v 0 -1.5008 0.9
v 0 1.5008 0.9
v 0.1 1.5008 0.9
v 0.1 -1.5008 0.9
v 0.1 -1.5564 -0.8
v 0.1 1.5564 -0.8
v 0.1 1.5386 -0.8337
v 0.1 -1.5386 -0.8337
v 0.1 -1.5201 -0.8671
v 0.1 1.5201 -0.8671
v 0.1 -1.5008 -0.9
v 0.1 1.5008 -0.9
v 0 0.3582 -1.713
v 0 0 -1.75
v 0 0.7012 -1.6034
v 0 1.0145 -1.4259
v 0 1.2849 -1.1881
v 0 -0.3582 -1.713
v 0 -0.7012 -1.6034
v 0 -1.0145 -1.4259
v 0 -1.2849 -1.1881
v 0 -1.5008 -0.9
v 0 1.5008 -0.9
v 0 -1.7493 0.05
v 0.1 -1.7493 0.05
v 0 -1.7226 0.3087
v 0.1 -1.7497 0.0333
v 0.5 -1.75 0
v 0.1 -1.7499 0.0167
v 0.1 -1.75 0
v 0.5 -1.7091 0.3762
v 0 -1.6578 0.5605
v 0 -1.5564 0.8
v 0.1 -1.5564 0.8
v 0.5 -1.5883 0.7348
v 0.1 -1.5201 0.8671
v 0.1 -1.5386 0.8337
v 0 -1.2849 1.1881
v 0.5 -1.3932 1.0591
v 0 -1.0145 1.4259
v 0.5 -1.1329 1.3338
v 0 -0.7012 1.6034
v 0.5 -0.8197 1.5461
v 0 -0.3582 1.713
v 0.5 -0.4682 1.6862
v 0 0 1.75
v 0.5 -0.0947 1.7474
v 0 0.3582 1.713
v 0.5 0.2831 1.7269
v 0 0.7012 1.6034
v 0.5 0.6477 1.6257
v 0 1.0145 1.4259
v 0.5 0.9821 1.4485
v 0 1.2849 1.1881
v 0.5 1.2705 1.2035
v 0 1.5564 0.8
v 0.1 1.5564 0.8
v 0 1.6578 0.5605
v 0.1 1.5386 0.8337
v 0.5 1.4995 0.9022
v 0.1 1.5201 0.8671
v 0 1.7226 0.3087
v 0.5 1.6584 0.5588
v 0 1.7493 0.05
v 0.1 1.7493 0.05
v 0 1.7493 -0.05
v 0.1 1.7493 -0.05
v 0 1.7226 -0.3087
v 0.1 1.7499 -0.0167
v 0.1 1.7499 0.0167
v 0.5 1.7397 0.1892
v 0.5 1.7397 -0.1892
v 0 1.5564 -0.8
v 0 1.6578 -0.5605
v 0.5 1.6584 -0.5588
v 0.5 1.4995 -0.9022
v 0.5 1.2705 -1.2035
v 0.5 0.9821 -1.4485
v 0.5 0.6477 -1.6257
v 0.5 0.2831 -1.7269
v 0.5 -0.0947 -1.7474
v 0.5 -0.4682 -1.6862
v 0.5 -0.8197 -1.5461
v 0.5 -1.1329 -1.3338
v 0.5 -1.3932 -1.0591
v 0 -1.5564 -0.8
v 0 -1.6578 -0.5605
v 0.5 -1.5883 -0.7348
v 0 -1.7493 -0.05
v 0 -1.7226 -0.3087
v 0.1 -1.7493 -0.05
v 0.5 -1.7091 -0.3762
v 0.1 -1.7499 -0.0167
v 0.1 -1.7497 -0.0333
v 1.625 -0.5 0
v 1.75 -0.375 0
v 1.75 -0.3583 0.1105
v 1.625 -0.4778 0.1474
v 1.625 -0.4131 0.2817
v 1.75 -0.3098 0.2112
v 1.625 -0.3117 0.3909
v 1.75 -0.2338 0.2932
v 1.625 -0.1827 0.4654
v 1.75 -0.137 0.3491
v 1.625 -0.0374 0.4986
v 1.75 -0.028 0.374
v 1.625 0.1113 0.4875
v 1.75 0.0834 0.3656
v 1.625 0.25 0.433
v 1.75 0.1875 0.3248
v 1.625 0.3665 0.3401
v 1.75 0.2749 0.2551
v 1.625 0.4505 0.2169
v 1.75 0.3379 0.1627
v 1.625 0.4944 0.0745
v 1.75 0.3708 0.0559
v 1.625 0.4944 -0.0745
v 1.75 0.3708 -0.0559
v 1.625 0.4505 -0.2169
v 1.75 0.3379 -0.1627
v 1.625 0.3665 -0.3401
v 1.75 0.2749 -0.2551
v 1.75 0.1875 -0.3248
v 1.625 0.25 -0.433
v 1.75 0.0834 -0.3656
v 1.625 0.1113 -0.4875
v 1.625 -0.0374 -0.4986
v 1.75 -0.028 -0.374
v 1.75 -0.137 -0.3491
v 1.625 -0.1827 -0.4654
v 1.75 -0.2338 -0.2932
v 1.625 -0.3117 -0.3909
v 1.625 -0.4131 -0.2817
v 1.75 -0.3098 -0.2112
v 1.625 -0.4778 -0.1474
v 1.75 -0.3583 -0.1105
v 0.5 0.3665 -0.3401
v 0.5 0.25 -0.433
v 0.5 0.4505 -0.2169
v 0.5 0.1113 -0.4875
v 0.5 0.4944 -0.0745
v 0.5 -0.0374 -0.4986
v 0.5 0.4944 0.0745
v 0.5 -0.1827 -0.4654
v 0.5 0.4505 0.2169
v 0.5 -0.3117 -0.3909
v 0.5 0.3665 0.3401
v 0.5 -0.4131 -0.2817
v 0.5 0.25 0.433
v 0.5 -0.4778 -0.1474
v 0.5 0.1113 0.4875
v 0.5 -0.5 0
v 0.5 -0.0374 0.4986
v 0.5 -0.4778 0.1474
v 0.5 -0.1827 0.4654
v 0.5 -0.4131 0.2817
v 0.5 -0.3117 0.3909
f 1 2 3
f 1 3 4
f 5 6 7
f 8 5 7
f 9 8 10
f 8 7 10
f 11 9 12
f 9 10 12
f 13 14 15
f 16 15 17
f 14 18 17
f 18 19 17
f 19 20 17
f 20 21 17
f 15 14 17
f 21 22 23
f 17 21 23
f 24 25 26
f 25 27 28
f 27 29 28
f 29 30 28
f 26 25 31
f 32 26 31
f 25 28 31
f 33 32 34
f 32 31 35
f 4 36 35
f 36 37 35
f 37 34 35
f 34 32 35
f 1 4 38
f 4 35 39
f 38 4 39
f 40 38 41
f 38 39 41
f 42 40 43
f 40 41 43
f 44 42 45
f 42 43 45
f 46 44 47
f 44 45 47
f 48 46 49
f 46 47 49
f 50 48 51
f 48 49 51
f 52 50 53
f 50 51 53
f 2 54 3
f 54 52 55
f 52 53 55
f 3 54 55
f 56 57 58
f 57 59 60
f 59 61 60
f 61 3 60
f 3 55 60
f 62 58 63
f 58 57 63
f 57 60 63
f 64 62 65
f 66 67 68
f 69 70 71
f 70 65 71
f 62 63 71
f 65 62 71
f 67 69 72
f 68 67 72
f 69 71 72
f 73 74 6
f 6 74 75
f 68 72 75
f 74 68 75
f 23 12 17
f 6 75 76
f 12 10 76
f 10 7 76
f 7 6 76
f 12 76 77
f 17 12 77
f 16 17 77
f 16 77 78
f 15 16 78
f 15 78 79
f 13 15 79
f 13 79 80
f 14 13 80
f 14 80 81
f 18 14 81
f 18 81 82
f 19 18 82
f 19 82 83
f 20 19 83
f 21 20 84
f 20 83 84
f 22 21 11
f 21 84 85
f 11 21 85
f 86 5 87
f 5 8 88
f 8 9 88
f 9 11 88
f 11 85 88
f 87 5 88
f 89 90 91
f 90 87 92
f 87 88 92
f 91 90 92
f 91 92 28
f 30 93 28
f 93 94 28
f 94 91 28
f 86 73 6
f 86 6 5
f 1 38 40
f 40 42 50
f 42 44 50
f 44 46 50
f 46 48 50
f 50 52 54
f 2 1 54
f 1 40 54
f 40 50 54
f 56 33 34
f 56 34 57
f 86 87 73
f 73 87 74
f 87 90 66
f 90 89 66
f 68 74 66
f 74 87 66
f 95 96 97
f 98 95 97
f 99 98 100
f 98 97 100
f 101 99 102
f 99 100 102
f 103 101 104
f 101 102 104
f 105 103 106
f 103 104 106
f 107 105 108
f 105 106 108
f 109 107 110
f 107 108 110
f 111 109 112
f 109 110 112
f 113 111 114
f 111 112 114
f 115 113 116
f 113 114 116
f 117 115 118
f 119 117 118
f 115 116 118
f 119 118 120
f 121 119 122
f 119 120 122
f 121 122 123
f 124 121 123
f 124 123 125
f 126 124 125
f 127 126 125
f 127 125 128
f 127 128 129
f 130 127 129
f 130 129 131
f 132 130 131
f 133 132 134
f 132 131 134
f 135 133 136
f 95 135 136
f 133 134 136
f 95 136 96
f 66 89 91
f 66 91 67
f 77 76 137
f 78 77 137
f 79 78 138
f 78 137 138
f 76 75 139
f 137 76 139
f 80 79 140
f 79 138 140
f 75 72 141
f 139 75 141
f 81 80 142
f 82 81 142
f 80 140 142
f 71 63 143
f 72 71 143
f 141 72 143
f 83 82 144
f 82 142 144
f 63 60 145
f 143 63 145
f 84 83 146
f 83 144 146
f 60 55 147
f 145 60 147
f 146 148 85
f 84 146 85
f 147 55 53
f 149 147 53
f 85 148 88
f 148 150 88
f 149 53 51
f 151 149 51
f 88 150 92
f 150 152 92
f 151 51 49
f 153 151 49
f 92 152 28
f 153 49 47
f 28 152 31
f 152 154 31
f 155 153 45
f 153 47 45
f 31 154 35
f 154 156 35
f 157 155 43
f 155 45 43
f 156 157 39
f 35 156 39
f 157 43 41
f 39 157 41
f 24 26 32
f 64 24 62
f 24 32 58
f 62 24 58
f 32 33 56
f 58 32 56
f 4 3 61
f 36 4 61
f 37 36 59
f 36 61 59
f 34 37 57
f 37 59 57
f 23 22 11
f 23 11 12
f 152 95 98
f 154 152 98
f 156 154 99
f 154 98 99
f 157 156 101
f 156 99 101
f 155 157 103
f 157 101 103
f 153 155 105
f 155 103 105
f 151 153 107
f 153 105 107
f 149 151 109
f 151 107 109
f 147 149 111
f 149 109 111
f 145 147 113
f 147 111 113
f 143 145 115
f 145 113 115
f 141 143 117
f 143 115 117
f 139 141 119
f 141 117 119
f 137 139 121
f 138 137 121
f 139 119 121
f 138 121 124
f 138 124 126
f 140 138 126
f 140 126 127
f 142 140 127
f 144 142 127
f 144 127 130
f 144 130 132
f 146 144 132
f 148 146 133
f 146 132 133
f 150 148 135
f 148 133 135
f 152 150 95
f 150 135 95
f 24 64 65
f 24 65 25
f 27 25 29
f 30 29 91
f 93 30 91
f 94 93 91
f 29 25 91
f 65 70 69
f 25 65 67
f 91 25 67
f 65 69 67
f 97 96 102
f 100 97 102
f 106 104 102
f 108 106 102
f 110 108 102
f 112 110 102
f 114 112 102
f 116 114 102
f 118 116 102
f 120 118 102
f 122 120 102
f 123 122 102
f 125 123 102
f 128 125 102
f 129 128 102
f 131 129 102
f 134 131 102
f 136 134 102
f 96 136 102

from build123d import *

# Parameters (mm, degrees)
CHAFL_N1_SIZE         = 0.125
CORTAR_EXTRUIR1_DEPTH = 0.1


with BuildPart() as part:
    # Croquis1 → Revolución1 (revolve)
    with BuildSketch(Plane.XY):
        Polygon((0, 0), (0, -1.75), (0.5, -1.75), (0.5, -0.5), (1.75, -0.5), (1.75, 0), align=None)
    revolve(axis=Axis((1.75, 0, 0), (-1, 0, 0)))

    # Chaflán1
    chafl_n1_edges = [part.edges().sort_by_distance(p)[0] for p in [
        (1.75, 0.5, 0),
    ]]
    chamfer(chafl_n1_edges, length=CHAFL_N1_SIZE)

    # Croquis7 → Cortar-Extruir1 (cut)
    with BuildSketch(Plane.ZY):
        with BuildLine():
            Line((-0.05, -1.749285568), (-0.05, 1.749285568))
            ThreePointArc((-0.05, 1.749285568), (0, 1.75), (0.05, 1.749285568))
            Line((0.05, 1.749285568), (0.05, -1.749285568))
            ThreePointArc((0.05, -1.749285568), (0, -1.75), (-0.05, -1.749285568))
        make_face()
        with BuildLine():
            Line((0.8, -1.556438242), (0.8, 1.556438242))
            ThreePointArc((0.8, 1.556438242), (0.850454574, 1.529453176), (0.9, 1.500833102))
            Line((0.9, 1.500833102), (0.9, -1.500833102))
            ThreePointArc((0.9, -1.500833102), (0.850454574, -1.529453176), (0.8, -1.556438242))
        make_face()
        with BuildLine():
            Line((-0.9, -1.500833102), (-0.9, 1.500833102))
            ThreePointArc((-0.9, 1.500833102), (-0.850454574, 1.529453176), (-0.8, 1.556438242))
            Line((-0.8, 1.556438242), (-0.8, -1.556438242))
            ThreePointArc((-0.8, -1.556438242), (-0.850454574, -1.529453176), (-0.9, -1.500833102))
        make_face()
    extrude(amount=-CORTAR_EXTRUIR1_DEPTH, mode=Mode.SUBTRACT)


solid = part.part
